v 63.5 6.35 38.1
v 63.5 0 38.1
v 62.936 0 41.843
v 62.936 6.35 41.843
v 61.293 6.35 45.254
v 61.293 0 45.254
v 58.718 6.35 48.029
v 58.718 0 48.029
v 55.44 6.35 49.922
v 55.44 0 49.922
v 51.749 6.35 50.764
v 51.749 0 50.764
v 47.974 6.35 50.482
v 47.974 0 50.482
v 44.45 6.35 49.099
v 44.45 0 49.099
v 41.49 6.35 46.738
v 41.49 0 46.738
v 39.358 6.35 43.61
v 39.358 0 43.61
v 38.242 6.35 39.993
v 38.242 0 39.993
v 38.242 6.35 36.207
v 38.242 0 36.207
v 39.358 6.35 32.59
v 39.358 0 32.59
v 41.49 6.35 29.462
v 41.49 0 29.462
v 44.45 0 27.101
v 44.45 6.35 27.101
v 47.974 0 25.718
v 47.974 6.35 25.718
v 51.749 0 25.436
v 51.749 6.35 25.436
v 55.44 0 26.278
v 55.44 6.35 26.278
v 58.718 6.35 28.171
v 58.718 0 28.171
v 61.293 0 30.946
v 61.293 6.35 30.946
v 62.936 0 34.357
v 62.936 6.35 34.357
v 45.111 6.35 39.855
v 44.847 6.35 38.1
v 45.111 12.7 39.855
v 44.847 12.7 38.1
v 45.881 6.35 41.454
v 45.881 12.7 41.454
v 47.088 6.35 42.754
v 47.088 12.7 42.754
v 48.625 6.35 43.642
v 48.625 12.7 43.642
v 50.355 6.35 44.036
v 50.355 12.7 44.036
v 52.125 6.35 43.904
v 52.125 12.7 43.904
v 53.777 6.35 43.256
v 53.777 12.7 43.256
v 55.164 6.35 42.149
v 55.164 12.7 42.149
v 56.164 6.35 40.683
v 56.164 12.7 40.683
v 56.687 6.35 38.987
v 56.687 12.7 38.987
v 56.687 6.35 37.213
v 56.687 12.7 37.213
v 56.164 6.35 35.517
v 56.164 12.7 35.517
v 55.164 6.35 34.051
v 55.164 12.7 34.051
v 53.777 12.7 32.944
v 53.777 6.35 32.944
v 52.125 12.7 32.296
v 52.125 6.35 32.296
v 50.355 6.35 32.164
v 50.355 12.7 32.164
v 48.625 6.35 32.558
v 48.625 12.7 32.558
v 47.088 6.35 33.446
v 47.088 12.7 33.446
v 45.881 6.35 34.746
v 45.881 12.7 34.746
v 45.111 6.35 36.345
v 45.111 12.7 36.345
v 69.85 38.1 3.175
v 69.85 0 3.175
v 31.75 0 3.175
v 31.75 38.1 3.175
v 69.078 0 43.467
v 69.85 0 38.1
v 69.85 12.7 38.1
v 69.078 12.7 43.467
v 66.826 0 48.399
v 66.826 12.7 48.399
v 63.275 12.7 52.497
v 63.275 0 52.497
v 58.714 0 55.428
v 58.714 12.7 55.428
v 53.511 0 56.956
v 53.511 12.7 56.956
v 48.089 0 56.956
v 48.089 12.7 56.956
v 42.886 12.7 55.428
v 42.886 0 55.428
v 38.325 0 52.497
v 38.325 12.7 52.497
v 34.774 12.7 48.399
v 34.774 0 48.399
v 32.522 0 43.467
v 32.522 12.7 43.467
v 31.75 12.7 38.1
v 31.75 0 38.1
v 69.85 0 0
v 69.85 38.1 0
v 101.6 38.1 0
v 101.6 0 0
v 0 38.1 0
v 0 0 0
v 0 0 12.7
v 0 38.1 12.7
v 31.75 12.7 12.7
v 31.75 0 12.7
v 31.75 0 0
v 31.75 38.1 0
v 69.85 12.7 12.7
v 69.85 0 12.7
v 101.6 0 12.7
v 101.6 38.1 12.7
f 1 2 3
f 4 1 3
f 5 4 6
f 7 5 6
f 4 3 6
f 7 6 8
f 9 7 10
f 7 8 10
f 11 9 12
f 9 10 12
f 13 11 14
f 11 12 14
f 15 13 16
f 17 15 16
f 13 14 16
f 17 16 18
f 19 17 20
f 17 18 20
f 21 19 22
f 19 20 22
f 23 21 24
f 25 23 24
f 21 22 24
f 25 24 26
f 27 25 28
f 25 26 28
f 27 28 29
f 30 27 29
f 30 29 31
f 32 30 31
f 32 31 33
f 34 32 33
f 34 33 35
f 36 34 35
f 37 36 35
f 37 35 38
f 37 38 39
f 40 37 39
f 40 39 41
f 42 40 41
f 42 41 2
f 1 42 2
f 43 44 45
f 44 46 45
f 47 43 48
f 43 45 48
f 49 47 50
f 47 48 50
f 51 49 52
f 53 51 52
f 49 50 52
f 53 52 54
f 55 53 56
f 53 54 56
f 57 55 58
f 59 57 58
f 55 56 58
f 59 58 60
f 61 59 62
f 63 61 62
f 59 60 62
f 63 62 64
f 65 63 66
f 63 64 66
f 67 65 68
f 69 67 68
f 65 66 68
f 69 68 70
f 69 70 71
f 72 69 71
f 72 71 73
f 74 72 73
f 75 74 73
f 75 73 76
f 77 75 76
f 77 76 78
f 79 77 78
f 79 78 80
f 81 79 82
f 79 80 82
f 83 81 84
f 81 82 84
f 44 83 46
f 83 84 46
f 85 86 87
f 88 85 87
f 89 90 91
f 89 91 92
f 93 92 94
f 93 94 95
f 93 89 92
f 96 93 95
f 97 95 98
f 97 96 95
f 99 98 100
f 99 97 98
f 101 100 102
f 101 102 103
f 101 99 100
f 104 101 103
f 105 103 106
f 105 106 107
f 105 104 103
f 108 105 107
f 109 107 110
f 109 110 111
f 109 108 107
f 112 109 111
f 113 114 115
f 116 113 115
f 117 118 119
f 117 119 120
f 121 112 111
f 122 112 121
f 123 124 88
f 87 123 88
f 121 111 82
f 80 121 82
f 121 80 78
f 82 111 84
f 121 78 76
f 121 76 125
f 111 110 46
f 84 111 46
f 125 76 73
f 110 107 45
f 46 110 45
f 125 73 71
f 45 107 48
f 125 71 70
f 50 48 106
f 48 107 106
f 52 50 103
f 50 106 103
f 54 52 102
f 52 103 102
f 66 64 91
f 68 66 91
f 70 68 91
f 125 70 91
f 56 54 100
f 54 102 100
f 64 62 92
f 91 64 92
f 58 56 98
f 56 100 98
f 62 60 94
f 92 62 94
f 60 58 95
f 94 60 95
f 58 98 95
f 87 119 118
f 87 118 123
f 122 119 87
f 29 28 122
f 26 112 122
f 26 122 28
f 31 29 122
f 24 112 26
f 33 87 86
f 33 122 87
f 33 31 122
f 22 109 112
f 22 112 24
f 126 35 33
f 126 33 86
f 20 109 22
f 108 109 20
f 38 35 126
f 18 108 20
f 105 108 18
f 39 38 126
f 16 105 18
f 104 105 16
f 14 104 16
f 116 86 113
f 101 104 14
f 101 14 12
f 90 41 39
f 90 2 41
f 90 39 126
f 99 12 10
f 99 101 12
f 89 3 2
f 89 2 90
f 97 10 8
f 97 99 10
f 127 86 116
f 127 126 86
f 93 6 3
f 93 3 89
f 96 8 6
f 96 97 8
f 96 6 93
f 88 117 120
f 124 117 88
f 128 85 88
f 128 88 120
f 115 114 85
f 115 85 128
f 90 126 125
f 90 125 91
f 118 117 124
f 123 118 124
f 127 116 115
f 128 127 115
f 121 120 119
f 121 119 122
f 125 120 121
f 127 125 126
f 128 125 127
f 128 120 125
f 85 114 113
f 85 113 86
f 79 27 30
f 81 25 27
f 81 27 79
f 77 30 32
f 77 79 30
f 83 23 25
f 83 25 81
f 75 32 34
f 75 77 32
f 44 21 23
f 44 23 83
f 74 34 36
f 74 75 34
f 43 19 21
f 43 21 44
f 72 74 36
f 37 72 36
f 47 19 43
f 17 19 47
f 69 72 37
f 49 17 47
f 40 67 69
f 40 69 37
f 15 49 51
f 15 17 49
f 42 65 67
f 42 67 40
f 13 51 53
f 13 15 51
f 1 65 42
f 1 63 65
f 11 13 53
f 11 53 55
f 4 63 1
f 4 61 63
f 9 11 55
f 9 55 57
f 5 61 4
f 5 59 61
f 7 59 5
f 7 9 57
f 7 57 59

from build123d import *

# Parameters (mm, degrees)
F0_W           = 101.6
F0_H           = 38.1
F1_DEPTH       = 12.7
F3_DEPTH       = 12.7
F4_D           = 11.90625
F4_CBORE_D     = 25.4
F4_CBORE_DEPTH = 6.35
F5_W           = 38.1
F5_H           = 3.175
F6_DEPTH       = 38.101


# Not quite as in the source:
# - a length typed as a fraction of an inch, garbled in the dataset ("3 / 203.2 mm" for 3/8 in), is restored


with BuildPart() as f1:
    # F0 (on Top) → F1 (new body)
    with BuildSketch(Plane.XY):
        with Locations((50.8, 19.05)):
            Rectangle(F0_W, F0_H)
    extrude(amount=F1_DEPTH)

    # F2 (on face) → F3 (join)
    with BuildSketch(Plane.XZ):
        with BuildLine():
            Line((31.75, 38.1), (31.75, 0))
            Line((31.75, 0), (69.85, 0))
            Line((69.85, 0), (69.85, 38.1))
            ThreePointArc((69.85, 38.1), (50.8, 57.15), (31.75, 38.1))
        make_face()
    extrude(amount=-F3_DEPTH)

    # F4 (through all)
    with Locations(Plane.XZ):
        with Locations((50.8, 38.1)):
            CounterBoreHole(F4_D / 2, F4_CBORE_D / 2, F4_CBORE_DEPTH)

    # F5 (on face) → F6 (cut, through all)
    with BuildSketch(Plane(origin=(0, 38.1, 0), x_dir=(-1, 0, 0), z_dir=(0, 1, 0))):
        with Locations((-50.8, 1.5875)):
            Rectangle(F5_W, F5_H)
    extrude(amount=-F6_DEPTH, mode=Mode.SUBTRACT)


solid = f1.part
